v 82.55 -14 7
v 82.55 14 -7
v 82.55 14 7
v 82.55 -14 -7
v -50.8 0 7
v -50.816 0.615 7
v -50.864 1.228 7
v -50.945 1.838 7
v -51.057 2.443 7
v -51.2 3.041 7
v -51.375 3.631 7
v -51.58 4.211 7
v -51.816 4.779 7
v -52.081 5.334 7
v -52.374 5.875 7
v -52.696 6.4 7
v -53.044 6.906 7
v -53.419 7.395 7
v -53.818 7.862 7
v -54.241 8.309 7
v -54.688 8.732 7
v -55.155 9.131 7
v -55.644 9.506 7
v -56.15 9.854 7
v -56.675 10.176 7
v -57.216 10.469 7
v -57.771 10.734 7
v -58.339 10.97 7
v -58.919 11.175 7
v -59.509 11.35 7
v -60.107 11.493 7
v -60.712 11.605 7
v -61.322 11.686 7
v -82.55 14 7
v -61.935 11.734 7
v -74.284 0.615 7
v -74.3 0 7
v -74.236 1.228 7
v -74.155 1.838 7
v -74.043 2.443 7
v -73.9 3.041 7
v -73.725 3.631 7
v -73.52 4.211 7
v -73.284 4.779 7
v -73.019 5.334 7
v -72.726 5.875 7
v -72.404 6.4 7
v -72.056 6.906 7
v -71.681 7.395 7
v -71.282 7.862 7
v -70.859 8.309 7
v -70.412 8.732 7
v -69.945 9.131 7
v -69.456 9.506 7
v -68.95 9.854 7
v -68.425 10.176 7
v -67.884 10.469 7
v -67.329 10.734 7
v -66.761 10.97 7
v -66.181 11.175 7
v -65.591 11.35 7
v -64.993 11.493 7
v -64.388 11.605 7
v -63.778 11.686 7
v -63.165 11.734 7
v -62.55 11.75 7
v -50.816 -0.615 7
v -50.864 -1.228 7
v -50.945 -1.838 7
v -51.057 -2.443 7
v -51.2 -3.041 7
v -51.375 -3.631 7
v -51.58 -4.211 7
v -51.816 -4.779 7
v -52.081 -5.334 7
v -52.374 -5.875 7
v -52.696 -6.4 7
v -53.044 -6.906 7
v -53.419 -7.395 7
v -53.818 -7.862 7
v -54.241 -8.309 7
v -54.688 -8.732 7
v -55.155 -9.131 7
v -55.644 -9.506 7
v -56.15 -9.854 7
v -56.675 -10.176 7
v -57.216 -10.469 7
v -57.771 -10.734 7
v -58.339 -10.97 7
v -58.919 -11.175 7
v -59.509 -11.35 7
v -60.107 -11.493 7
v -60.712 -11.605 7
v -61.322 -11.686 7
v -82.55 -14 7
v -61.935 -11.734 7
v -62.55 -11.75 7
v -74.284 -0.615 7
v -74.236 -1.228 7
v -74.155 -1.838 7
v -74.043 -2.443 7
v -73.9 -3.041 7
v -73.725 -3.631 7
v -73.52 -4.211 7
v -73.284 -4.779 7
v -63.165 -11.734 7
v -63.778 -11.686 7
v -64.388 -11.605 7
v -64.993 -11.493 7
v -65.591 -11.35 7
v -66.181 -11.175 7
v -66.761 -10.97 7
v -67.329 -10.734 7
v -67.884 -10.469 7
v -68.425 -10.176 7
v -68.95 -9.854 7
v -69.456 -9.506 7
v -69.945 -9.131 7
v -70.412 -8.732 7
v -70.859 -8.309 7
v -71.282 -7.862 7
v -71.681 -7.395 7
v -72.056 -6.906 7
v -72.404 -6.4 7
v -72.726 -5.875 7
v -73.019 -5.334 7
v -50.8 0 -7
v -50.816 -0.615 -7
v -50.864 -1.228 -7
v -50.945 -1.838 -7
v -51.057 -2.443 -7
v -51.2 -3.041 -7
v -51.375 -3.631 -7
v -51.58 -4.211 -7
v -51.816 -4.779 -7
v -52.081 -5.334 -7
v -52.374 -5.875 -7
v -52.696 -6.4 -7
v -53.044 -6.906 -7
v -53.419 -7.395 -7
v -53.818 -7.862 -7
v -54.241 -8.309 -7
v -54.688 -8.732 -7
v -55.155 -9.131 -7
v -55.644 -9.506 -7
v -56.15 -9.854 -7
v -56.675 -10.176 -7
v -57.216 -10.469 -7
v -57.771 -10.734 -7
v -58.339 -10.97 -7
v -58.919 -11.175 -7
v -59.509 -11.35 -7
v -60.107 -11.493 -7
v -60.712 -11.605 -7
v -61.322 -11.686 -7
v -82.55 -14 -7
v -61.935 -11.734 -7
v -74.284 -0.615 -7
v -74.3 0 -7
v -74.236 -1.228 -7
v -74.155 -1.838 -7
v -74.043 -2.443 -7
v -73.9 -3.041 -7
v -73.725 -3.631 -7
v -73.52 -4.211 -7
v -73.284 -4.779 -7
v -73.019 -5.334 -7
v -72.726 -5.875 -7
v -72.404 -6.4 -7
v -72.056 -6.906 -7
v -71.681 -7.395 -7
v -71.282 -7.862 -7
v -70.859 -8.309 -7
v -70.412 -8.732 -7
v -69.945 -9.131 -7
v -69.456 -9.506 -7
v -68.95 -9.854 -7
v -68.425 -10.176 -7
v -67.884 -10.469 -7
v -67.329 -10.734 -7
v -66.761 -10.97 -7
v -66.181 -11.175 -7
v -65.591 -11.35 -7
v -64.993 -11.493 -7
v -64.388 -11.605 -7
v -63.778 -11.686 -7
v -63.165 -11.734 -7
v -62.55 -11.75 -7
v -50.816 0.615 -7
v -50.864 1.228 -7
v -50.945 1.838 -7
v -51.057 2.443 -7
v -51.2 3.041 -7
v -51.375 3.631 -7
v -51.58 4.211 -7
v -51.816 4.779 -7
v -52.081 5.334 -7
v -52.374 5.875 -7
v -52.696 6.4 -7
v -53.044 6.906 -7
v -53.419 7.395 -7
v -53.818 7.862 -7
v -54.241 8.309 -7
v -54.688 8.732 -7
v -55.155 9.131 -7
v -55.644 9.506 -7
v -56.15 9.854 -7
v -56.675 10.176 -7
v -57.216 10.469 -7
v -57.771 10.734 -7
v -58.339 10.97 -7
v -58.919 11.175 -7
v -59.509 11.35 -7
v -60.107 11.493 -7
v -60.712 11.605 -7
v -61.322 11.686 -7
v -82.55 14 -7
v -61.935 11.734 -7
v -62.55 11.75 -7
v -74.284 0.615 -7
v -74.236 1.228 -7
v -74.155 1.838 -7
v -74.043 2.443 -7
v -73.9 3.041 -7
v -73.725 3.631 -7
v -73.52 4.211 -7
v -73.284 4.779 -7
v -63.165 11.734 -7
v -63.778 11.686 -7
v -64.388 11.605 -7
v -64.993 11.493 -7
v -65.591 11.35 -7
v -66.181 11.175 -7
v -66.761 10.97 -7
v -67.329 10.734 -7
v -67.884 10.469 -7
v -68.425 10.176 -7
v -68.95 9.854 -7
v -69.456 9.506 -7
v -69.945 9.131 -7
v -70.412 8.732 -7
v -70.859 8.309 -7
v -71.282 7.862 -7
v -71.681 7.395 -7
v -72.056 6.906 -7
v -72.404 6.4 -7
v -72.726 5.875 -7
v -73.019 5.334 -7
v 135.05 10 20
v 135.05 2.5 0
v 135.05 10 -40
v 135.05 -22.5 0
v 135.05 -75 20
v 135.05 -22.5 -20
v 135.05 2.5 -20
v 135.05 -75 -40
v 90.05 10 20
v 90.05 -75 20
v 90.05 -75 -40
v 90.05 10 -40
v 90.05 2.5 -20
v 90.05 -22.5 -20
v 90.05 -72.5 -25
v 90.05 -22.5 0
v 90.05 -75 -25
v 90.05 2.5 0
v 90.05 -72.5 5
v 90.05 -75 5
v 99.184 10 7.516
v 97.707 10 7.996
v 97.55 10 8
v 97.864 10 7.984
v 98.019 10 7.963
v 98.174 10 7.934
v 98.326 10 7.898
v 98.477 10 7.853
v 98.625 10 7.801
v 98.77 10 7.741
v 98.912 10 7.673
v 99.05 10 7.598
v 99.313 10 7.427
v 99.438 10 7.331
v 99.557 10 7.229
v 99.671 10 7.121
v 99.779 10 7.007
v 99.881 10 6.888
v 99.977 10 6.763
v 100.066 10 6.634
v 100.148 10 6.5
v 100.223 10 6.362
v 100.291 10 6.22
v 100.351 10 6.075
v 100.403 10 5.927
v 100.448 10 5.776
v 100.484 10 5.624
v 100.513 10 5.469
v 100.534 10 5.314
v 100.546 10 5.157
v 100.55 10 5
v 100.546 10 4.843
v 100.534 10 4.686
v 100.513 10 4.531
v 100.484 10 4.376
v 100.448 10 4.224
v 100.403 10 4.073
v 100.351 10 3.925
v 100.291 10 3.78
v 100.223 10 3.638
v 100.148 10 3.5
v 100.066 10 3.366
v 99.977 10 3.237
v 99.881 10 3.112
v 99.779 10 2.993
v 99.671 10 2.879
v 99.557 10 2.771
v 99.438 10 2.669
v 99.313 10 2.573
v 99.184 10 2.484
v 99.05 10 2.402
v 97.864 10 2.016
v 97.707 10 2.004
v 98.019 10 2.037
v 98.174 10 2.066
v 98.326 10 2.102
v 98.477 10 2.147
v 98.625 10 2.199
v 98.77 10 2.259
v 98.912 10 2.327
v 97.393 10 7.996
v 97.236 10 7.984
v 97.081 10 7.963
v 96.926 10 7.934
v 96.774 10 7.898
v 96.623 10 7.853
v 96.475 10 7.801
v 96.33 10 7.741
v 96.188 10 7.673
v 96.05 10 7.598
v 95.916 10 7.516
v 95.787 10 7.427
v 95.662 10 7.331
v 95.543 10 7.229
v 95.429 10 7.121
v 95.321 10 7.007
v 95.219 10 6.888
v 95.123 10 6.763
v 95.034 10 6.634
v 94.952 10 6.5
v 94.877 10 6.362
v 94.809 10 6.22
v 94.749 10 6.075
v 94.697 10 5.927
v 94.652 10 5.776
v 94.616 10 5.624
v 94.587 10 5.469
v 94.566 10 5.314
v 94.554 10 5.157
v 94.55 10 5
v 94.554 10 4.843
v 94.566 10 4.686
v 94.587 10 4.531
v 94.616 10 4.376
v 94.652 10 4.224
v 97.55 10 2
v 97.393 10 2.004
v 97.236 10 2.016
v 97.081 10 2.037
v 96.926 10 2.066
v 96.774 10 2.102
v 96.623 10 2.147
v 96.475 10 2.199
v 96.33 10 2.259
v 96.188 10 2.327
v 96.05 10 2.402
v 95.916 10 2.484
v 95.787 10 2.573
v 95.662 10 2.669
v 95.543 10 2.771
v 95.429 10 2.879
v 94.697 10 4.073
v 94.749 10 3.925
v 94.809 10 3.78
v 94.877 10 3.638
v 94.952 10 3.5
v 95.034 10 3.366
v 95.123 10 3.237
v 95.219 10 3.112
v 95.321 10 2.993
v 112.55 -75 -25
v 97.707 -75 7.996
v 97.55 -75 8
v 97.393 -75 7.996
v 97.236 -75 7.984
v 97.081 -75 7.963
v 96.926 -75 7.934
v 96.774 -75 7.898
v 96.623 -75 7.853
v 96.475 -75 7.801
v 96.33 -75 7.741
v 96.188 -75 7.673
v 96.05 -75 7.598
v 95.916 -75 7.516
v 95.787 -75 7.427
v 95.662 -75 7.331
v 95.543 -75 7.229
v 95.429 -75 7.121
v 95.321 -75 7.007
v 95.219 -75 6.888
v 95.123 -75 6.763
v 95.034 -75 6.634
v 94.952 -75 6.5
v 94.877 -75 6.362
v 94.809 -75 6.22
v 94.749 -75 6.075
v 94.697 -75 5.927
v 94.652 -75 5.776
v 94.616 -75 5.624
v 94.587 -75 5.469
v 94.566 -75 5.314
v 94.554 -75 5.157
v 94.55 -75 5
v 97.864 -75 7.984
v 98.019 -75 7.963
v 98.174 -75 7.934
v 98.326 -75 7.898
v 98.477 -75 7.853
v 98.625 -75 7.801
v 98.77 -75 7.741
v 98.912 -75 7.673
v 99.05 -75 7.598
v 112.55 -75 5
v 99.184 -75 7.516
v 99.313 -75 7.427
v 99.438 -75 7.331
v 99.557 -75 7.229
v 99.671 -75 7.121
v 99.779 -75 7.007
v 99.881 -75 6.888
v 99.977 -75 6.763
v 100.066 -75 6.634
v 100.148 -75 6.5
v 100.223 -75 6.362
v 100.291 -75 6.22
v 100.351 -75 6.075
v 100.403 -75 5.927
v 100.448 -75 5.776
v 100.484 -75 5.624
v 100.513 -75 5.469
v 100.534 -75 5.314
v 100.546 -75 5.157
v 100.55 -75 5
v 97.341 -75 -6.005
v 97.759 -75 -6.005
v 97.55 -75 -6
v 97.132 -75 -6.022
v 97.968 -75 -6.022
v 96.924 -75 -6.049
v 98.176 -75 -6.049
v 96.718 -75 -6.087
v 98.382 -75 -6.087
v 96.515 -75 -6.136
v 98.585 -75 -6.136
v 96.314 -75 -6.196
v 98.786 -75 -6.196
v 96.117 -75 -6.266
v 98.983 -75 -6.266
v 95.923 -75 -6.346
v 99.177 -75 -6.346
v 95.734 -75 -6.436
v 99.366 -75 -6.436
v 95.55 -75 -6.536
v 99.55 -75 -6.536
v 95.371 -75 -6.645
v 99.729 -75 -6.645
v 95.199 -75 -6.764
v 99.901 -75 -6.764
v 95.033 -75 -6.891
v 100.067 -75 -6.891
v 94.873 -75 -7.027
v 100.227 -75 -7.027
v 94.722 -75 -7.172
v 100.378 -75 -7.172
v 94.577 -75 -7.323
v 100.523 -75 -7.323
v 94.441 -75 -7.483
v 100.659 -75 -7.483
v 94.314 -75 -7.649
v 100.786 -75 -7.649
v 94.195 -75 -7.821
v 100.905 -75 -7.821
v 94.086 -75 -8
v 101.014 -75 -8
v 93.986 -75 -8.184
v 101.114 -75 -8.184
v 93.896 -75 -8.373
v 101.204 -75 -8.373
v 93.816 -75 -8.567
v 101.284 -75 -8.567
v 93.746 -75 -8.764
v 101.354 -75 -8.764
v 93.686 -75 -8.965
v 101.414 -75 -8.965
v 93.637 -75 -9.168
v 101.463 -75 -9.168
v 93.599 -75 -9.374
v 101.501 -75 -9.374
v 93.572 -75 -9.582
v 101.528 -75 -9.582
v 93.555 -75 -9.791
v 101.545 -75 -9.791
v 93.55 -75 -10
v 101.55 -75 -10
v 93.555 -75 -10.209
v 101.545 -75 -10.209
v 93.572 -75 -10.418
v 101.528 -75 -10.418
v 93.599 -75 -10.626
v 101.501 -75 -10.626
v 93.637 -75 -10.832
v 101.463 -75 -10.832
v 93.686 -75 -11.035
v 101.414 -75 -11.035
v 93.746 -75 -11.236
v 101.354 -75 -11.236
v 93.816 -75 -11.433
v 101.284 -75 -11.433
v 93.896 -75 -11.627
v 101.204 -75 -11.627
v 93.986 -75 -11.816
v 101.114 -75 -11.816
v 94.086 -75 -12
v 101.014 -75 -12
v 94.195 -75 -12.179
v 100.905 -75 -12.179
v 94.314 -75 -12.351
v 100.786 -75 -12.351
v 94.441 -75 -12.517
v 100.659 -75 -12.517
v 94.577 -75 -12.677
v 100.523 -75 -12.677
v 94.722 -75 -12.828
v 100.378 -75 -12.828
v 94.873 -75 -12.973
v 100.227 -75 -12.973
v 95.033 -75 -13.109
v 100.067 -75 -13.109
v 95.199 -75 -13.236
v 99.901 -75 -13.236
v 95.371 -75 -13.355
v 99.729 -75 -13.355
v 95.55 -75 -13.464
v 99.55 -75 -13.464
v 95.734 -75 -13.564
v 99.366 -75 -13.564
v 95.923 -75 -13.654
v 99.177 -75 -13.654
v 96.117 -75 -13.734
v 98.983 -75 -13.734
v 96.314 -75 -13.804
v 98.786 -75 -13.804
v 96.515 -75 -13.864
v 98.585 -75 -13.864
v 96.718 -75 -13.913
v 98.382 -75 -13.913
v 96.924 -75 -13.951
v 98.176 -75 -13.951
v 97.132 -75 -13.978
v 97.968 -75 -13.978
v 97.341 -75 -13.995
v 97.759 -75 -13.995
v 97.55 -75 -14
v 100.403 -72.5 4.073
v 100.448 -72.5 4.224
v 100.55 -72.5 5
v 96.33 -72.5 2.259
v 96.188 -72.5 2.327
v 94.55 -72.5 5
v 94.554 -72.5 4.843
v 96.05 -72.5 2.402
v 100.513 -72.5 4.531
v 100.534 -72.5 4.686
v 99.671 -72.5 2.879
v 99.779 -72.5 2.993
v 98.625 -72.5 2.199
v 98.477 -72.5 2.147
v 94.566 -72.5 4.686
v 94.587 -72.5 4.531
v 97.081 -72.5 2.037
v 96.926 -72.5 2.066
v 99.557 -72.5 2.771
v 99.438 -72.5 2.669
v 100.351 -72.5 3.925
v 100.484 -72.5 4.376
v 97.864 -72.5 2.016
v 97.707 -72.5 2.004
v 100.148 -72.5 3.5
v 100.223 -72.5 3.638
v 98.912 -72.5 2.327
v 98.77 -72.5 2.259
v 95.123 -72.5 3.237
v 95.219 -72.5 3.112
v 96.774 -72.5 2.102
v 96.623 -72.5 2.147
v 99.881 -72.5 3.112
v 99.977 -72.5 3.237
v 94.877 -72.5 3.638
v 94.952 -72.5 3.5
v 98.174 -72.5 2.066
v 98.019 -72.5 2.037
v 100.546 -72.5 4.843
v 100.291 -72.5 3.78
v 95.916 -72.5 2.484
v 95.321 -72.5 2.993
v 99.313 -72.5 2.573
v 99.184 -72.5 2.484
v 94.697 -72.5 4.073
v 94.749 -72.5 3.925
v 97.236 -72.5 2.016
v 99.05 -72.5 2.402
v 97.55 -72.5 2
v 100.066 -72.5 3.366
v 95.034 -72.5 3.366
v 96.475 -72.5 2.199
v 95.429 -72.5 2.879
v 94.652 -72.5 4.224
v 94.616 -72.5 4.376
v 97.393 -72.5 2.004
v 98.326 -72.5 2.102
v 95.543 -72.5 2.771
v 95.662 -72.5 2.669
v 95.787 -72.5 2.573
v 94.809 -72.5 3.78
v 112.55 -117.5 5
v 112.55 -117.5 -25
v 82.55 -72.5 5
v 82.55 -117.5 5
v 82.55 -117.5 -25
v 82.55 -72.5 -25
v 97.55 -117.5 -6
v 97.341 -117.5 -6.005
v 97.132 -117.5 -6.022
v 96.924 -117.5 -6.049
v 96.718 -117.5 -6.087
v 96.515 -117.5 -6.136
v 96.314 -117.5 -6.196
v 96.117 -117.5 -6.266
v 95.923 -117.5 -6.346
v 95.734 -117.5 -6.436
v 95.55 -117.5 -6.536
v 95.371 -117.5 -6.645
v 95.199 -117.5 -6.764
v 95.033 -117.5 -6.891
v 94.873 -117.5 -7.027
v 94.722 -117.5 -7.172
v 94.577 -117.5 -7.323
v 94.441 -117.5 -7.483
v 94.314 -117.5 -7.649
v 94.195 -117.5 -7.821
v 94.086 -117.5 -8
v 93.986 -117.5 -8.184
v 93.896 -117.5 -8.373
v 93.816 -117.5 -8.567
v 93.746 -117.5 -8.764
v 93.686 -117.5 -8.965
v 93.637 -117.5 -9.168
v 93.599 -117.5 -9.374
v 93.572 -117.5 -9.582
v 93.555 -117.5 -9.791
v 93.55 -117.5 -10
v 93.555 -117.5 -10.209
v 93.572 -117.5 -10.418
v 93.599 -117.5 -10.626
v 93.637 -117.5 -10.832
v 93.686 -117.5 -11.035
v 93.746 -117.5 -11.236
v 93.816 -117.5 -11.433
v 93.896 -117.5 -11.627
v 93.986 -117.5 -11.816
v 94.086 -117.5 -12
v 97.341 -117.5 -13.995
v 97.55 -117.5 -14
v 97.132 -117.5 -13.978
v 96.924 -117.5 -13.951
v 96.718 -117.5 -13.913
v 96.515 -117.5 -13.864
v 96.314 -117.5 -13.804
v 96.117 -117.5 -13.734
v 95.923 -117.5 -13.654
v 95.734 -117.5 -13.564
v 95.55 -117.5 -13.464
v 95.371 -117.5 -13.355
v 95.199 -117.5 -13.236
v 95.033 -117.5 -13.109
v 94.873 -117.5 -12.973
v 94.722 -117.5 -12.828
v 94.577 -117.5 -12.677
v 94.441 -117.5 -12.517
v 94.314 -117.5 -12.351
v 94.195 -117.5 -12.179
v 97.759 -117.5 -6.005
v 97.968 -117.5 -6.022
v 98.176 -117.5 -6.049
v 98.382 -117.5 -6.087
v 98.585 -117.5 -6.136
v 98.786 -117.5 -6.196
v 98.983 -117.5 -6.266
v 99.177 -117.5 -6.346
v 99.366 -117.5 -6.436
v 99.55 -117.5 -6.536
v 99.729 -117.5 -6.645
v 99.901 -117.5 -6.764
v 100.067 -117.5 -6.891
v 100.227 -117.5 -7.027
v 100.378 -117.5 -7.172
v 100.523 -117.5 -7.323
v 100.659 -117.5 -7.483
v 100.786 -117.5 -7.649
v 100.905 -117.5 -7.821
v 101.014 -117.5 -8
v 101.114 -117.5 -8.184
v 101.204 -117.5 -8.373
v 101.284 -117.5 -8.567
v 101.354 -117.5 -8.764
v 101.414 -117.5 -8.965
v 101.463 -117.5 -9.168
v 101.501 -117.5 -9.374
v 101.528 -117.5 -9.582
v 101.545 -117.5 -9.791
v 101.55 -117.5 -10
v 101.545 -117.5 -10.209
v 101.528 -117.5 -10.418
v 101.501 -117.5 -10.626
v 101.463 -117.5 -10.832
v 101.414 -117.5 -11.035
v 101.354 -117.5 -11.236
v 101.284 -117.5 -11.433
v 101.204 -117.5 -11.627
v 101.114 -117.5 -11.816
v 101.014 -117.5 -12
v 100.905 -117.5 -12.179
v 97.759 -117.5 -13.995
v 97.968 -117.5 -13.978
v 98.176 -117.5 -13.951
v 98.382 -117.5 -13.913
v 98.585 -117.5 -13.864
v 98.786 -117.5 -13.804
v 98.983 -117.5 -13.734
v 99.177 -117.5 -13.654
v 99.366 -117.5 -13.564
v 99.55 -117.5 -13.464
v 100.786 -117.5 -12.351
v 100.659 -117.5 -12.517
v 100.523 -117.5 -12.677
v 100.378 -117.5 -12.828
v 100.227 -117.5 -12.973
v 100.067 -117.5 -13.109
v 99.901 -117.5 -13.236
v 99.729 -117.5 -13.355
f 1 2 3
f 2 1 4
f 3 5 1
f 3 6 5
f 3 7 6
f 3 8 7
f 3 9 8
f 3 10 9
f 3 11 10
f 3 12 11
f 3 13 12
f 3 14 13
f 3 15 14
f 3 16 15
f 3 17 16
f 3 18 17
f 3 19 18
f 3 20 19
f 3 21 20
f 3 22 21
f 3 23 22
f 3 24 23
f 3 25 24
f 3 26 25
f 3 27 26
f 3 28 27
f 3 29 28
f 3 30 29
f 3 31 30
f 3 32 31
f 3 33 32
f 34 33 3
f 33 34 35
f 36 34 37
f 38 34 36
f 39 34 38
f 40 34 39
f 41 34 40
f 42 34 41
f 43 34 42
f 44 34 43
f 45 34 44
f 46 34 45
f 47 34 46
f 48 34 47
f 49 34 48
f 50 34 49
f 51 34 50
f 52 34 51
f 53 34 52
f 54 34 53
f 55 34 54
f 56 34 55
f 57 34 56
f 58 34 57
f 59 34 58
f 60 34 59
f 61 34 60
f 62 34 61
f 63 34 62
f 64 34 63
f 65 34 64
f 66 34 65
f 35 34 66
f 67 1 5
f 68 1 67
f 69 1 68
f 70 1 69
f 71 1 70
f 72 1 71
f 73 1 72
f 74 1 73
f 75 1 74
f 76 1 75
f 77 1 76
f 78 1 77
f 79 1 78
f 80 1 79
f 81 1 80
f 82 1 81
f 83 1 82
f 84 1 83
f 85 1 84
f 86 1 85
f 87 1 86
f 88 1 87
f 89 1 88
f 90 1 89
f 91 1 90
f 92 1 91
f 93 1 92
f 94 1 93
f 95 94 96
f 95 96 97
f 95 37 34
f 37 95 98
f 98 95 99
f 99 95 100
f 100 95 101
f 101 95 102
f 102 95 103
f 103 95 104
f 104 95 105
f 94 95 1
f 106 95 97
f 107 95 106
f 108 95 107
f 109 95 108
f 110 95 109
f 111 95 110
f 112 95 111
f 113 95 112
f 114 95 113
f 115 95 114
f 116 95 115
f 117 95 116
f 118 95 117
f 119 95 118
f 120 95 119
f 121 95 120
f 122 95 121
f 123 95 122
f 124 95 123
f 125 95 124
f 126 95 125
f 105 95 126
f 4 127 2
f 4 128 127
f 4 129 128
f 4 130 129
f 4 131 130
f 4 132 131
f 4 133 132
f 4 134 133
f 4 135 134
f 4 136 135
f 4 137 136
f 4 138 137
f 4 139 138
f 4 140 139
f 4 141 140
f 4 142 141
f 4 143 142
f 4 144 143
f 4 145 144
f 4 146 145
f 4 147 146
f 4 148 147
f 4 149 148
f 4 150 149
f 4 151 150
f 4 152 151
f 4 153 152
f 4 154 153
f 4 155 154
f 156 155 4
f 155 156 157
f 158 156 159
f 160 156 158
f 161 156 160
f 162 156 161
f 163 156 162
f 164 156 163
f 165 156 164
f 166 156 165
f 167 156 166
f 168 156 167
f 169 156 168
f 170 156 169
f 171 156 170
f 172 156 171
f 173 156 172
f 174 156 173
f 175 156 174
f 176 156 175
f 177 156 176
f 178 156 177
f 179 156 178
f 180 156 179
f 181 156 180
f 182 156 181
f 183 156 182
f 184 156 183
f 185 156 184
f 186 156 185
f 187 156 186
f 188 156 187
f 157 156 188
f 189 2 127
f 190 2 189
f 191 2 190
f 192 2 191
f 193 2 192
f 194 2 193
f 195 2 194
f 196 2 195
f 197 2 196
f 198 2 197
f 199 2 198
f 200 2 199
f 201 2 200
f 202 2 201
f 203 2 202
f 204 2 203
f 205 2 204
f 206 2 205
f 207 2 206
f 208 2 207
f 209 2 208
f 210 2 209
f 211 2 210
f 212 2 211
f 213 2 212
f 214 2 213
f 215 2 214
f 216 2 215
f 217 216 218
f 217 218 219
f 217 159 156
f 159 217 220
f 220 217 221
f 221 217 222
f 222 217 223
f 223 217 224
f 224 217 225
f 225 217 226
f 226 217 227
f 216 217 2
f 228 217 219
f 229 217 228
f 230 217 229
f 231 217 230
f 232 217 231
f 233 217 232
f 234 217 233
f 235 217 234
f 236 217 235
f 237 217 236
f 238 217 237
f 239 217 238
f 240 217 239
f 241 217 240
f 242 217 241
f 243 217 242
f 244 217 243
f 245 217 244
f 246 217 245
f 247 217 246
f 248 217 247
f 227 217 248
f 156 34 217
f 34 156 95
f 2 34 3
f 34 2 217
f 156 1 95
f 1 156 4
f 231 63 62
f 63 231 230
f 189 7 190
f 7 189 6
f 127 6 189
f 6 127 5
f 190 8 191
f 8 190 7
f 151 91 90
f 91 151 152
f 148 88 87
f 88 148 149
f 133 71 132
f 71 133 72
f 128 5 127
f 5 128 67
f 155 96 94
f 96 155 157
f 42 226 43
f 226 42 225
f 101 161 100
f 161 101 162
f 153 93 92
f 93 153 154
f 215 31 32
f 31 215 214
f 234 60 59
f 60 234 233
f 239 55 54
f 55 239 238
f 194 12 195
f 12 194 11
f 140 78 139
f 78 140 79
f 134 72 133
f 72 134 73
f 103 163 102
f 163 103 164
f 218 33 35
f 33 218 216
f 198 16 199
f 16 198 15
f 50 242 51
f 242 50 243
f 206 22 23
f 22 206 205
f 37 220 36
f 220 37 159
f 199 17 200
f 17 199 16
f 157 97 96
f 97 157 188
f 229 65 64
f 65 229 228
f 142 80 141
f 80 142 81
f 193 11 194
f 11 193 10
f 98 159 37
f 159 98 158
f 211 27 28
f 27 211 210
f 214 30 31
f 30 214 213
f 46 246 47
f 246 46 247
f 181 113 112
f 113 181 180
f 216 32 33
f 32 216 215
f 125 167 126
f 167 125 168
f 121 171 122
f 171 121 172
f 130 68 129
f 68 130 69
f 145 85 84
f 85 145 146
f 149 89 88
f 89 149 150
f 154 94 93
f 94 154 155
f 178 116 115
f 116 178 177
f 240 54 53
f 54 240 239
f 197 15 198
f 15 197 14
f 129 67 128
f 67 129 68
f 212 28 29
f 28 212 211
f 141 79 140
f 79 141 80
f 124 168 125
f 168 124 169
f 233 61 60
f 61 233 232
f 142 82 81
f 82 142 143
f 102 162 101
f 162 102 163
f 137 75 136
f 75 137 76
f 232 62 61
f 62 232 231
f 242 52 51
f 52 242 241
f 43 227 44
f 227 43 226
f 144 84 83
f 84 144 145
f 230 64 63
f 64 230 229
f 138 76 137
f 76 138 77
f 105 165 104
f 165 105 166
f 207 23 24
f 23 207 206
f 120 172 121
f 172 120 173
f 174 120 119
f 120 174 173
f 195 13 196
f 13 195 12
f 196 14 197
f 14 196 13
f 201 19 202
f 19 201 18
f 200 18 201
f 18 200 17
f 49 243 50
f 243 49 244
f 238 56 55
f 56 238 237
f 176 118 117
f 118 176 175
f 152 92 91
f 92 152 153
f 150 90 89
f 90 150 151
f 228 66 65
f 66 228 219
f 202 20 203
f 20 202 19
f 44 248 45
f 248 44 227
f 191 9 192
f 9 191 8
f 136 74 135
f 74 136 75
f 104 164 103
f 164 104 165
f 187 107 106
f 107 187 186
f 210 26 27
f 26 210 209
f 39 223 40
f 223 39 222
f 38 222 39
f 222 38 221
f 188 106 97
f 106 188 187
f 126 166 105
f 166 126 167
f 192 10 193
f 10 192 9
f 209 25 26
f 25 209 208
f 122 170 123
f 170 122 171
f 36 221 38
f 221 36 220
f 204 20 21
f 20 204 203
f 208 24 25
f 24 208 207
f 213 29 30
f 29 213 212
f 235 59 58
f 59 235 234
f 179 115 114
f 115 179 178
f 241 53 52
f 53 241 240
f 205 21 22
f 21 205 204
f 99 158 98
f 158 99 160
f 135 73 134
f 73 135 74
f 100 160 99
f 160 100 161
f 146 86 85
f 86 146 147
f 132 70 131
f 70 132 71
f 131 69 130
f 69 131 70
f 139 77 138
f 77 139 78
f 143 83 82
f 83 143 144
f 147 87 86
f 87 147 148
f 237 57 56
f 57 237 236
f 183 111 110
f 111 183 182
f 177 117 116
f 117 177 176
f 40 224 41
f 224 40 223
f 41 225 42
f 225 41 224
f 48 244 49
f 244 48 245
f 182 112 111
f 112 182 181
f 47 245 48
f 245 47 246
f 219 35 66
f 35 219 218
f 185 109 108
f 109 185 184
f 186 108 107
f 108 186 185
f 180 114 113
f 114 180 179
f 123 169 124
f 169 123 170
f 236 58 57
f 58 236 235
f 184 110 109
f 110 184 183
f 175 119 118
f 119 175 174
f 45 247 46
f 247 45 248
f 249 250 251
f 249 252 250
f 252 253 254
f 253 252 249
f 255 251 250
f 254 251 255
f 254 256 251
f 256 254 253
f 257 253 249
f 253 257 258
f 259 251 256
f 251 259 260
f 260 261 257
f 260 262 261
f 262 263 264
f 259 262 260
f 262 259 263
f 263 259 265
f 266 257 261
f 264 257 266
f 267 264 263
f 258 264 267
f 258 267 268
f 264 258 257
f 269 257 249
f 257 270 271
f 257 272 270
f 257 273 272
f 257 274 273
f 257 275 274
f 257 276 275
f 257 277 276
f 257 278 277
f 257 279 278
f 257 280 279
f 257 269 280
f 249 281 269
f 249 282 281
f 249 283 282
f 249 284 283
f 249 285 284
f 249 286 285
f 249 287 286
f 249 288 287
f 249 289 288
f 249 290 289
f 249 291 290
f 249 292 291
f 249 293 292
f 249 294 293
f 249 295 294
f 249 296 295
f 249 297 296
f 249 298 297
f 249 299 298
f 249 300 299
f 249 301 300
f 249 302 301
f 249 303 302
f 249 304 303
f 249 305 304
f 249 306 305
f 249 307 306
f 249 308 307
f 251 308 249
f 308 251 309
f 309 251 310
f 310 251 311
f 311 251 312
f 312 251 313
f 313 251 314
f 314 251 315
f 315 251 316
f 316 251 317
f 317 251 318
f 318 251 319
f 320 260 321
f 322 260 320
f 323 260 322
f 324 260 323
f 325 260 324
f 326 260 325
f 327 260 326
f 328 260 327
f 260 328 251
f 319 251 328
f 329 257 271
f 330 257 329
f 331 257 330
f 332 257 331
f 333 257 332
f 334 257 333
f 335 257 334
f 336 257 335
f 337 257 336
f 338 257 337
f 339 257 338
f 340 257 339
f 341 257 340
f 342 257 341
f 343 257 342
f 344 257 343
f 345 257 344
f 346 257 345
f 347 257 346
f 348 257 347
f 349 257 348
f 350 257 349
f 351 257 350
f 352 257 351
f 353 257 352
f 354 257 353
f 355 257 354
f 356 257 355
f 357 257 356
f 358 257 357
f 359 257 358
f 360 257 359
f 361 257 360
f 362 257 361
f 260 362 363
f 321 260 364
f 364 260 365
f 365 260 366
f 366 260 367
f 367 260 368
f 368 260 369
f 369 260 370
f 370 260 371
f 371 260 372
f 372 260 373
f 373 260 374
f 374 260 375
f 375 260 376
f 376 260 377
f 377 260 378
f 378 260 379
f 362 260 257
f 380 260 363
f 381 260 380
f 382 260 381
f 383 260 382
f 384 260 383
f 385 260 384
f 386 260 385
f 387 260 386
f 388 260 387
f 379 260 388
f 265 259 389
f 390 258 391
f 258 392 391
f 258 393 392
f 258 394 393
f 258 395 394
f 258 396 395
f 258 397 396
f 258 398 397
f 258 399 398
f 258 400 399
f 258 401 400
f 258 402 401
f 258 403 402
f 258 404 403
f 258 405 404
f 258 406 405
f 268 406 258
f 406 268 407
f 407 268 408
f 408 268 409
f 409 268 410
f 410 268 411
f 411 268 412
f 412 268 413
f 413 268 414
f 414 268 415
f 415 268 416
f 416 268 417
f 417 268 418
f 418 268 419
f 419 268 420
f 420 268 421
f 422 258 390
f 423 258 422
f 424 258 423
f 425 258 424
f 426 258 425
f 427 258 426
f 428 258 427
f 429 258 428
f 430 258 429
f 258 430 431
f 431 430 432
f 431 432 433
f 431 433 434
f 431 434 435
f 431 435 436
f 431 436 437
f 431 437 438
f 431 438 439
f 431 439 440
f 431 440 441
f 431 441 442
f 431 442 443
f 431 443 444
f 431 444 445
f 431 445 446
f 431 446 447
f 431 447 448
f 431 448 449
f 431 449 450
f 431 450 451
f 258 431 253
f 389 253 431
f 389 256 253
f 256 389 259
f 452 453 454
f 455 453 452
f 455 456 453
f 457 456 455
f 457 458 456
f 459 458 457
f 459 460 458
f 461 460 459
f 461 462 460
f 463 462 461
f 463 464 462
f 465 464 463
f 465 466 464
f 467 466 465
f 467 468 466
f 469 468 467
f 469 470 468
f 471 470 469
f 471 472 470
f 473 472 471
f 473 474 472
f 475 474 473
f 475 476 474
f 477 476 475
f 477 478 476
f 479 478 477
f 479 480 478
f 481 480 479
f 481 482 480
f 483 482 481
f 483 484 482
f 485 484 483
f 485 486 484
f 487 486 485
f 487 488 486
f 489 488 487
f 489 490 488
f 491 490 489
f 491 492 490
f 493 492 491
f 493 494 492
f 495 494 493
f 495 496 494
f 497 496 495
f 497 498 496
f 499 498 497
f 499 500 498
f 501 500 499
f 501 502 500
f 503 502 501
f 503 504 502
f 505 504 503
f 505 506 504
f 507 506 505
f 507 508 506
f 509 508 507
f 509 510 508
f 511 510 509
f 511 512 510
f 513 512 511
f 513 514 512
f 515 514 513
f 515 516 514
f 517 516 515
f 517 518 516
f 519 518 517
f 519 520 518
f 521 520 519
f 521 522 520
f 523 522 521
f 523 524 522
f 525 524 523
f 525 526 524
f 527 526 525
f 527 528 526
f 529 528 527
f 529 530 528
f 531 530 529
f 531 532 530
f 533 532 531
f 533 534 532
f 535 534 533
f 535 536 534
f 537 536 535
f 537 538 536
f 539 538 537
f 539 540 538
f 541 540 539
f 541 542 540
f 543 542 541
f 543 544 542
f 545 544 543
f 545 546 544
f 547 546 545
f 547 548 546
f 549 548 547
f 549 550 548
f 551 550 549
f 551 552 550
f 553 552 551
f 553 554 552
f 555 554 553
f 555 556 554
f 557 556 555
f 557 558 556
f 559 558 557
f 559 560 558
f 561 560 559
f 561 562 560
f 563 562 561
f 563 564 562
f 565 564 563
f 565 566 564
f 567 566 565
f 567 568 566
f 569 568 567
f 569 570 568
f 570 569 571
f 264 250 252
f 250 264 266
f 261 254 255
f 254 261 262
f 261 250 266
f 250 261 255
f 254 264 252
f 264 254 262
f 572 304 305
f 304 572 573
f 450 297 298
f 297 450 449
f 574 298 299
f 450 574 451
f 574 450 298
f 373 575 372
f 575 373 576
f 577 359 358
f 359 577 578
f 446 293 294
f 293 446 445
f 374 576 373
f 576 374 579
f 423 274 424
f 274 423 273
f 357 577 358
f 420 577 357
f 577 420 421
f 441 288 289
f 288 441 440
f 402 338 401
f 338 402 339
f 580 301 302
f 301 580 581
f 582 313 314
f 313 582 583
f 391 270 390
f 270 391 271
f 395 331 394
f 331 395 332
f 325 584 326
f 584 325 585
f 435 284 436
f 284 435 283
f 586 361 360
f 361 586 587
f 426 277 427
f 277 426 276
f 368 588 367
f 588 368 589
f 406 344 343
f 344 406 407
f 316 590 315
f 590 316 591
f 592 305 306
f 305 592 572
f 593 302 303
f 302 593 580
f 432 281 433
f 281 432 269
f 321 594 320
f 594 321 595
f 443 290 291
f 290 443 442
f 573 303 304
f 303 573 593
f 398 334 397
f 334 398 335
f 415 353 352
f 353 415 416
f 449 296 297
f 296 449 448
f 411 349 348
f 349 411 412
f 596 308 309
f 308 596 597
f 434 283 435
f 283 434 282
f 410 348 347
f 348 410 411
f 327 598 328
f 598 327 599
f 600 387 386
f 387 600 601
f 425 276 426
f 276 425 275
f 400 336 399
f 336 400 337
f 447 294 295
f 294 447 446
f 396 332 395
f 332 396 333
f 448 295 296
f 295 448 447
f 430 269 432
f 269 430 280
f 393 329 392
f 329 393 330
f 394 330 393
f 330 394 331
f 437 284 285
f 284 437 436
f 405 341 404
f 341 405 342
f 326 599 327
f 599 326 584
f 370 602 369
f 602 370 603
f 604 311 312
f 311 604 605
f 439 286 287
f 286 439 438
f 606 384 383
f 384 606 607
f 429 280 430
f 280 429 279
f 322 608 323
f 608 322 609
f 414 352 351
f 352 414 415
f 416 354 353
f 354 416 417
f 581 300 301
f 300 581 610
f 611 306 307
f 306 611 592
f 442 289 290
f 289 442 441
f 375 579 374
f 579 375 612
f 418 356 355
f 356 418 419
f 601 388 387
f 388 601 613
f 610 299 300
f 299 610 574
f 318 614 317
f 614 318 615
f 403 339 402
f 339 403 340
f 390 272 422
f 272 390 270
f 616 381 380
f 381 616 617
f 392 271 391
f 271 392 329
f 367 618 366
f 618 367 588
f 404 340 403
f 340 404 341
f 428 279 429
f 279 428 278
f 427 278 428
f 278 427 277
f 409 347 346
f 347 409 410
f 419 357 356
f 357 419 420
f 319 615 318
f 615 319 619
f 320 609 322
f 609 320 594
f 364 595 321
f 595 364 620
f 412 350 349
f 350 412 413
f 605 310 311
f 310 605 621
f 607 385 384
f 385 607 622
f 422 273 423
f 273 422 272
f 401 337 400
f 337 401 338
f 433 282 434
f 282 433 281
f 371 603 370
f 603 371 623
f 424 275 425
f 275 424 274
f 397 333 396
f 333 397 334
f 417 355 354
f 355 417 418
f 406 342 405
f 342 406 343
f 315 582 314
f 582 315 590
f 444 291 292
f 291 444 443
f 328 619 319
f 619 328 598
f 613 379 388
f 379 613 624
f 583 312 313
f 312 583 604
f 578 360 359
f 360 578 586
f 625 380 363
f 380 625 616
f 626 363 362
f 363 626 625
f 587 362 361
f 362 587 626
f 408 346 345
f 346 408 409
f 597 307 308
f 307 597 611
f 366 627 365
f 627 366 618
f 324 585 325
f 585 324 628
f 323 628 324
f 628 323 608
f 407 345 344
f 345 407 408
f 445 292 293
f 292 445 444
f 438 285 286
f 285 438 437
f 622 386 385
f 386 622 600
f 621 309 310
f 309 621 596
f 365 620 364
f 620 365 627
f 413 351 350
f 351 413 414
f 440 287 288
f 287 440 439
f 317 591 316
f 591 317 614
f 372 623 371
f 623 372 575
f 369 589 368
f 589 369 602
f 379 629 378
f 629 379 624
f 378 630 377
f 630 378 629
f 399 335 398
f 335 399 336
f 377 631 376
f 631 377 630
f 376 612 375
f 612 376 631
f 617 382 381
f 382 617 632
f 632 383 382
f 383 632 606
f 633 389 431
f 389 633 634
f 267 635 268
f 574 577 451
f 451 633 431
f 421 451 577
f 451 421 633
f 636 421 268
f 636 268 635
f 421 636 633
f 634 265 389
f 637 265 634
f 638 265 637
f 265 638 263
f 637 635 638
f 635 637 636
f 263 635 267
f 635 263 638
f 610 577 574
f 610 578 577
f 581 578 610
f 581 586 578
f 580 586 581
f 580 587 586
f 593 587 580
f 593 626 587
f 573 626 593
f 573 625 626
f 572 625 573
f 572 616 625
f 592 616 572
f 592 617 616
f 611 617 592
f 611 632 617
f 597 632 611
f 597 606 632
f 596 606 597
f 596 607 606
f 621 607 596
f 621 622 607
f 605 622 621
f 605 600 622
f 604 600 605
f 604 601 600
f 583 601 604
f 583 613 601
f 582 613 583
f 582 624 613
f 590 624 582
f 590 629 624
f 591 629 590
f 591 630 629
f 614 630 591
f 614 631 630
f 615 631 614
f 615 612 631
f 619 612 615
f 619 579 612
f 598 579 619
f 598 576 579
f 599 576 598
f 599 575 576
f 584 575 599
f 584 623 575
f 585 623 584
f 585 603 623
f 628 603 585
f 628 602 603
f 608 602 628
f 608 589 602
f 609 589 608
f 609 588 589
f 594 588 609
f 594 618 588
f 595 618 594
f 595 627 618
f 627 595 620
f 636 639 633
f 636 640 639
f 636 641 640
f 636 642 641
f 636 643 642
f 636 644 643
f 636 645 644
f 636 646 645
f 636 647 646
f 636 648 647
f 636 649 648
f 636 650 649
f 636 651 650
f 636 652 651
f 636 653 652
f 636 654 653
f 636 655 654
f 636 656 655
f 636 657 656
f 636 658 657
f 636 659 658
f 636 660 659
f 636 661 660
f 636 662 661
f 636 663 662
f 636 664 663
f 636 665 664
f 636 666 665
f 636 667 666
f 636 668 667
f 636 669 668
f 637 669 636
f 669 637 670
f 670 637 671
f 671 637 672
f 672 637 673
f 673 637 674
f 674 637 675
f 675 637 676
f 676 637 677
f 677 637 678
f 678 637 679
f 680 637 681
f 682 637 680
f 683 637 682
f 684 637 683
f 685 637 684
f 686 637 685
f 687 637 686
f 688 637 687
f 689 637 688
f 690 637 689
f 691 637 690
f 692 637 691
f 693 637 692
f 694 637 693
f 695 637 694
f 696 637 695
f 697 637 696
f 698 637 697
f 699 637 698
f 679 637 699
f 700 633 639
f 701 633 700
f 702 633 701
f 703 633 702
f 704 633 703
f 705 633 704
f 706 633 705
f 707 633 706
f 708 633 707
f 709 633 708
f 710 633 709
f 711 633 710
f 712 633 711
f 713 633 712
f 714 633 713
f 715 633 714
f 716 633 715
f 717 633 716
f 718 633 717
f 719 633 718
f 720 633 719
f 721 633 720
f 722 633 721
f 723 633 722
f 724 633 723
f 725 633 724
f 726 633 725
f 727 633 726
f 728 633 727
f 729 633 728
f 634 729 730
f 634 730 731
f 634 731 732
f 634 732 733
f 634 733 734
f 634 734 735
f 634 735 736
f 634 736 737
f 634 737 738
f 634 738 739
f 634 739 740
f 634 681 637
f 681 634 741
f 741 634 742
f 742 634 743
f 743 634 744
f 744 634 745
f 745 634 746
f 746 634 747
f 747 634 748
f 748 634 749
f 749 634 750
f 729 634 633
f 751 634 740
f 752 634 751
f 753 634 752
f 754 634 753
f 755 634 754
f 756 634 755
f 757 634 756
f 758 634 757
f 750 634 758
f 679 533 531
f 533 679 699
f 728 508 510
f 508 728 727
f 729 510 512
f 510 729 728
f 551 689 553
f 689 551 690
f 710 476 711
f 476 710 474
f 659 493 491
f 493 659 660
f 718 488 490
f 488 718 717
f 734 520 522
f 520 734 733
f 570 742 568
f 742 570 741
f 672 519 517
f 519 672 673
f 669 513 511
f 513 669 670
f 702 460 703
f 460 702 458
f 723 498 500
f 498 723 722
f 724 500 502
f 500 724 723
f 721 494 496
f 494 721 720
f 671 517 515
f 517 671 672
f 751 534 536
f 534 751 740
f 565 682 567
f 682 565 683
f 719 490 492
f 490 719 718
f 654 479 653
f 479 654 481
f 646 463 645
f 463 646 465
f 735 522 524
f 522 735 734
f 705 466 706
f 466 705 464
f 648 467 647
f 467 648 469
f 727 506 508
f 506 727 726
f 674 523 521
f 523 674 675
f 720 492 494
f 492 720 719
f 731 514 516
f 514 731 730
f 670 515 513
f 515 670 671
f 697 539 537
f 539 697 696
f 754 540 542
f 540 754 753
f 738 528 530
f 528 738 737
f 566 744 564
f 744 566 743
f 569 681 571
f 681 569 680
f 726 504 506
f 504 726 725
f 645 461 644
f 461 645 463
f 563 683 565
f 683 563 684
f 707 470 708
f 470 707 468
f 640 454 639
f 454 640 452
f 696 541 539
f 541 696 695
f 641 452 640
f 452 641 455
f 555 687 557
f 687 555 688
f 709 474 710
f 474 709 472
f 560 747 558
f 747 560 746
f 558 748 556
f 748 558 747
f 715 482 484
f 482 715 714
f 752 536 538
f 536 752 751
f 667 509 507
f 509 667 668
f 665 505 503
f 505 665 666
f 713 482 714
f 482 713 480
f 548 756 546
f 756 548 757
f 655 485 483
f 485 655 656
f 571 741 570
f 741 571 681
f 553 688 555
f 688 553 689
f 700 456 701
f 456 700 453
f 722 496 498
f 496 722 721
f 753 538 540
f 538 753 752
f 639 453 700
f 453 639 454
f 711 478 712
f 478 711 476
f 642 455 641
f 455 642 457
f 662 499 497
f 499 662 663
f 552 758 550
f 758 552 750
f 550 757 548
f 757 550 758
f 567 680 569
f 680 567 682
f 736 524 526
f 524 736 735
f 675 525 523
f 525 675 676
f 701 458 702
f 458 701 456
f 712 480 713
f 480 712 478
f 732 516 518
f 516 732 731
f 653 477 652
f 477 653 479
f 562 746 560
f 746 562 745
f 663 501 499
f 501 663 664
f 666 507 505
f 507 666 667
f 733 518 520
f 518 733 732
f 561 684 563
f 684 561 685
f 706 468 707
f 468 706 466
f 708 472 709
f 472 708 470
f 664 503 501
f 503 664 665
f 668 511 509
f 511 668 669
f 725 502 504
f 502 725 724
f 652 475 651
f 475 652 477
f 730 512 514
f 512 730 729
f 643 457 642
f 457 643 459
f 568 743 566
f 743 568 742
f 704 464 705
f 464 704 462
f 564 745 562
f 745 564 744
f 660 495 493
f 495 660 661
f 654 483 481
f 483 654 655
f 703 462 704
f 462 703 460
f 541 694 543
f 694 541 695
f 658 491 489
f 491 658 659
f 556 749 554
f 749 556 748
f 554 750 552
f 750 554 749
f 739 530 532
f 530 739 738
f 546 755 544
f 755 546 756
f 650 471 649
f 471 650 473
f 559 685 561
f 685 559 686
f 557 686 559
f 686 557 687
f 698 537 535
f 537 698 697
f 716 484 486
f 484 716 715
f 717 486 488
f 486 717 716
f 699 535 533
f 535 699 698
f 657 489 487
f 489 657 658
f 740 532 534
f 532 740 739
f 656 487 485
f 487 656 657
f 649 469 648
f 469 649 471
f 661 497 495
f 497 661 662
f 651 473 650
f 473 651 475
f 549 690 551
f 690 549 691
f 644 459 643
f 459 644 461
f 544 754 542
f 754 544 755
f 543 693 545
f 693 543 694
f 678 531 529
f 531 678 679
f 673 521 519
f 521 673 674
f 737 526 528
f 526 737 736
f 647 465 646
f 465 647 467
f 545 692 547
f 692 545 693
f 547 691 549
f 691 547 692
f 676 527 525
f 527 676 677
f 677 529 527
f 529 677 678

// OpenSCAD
// ====================================================================================
// REVOLUTIONARY TECHNOLOGY COMPANY & UNIVERSITY OF WASHINGTON DEPARTMENT OF PHYSICS
// Subsystem: copo_door_handles.scad (Authentic 1969 Handle & Latch Matrix)
// Core Objective: Structural casing for 1969 push-button exterior / pull-lever inner handles
// Center Origin (0,0,0) = Geometric Centerpoint of the Exterior Push-Button Mechanism
// ====================================================================================

$fn = 120; // High-fidelity CNC laser-cut and die-cast tooling path resolution

// --- 1969 Factory Mechanical Constants (mm) ---
inch_to_mm         = 25.4;
handle_length      = 6.50 * inch_to_mm;   // 165.1 mm original chrome handle length
push_button_dia    = 22.00;              // 1969 factory mechanical push cylinder
latch_block_depth  = 85.00;              // Depth of the internal claw-latch unit
cable_guide_bore   = 6.00;               // Clearance bore for high-tensile aircraft cables

// Production Configuration Selector
// 1 = Base/SS Street Spec (Pure Mechanical Latch), 2 = Tactical Police / NHRA Drag Spec (Solenoid Interlocked)
DOOR_LOCK_VARIANT = 2;

module exterior_chrome_handle_casing() {
    echo(str("COMPILING HISTORICAL 1969 DOOR HANDLE COMPONENT: ", (DOOR_LOCK_VARIANT == 2) ? "TACTICAL_SOLENOID_INTERLOCKED" : "PURE_MECHANICAL_STREET"));
    color("Chrome") { // High-polish mirror finish representation
        difference() {
            // Main rectangular exterior handle body casting strip
            cube([handle_length, 28, 14], center=true);
            
            // Left side recess pocket for the thumb push-button assembly
            translate([-handle_length/2 + 20, 0, 2])
                cylinder(d=push_button_dia + 1.5, h=20, center=true);
        }
    }
}

module internal_claw_latch_block() {
    // Mechanical rotor claw that locks onto the chassis B-pillar striker pin
    color("DimGrey") {
        translate([handle_length/2 + 30, -latch_block_depth/2 + 10, -10]) {
            difference() {
                cube([45, latch_block_depth, 60], center=true);
                // Striker pin entry jaw slot
                translate([0, latch_block_depth/2 - 20, 0])
                    cube([50, 25, 20], center=true);
                // Pre-drilled channel routing the low-friction inner aircraft actuator cables
                translate([-15, 0, 15])
                    rotate([90, 0, 0])
                        cylinder(d=cable_guide_bore, h=latch_block_depth + 2, center=true);
            }
        }
    }
}

module tactical_lock_actuator() {
    // High-speed, low-draw inline locking solenoid module used on Track/Police setups.
    // Physically blocks the handle linkage from releasing the claw latch while in motion.
    if (DOOR_LOCK_VARIANT == 2) {
        color("FireBrick") {
            translate([handle_length/2 + 15, -latch_block_depth - 10, -10]) {
                difference() {
                    cube([30, 45, 30], center=true);
                    // Center plunger locking deadbolt shaft channel
                    rotate([90, 0, 0])
                        cylinder(d=8.0, h=47, center=true);
                }
            }
        }
    }
}

// --- Composite Structural System Instantiation ---
union() {
    exterior_chrome_handle_casing();
    internal_claw_latch_block();
    tactical_lock_actuator();
}
